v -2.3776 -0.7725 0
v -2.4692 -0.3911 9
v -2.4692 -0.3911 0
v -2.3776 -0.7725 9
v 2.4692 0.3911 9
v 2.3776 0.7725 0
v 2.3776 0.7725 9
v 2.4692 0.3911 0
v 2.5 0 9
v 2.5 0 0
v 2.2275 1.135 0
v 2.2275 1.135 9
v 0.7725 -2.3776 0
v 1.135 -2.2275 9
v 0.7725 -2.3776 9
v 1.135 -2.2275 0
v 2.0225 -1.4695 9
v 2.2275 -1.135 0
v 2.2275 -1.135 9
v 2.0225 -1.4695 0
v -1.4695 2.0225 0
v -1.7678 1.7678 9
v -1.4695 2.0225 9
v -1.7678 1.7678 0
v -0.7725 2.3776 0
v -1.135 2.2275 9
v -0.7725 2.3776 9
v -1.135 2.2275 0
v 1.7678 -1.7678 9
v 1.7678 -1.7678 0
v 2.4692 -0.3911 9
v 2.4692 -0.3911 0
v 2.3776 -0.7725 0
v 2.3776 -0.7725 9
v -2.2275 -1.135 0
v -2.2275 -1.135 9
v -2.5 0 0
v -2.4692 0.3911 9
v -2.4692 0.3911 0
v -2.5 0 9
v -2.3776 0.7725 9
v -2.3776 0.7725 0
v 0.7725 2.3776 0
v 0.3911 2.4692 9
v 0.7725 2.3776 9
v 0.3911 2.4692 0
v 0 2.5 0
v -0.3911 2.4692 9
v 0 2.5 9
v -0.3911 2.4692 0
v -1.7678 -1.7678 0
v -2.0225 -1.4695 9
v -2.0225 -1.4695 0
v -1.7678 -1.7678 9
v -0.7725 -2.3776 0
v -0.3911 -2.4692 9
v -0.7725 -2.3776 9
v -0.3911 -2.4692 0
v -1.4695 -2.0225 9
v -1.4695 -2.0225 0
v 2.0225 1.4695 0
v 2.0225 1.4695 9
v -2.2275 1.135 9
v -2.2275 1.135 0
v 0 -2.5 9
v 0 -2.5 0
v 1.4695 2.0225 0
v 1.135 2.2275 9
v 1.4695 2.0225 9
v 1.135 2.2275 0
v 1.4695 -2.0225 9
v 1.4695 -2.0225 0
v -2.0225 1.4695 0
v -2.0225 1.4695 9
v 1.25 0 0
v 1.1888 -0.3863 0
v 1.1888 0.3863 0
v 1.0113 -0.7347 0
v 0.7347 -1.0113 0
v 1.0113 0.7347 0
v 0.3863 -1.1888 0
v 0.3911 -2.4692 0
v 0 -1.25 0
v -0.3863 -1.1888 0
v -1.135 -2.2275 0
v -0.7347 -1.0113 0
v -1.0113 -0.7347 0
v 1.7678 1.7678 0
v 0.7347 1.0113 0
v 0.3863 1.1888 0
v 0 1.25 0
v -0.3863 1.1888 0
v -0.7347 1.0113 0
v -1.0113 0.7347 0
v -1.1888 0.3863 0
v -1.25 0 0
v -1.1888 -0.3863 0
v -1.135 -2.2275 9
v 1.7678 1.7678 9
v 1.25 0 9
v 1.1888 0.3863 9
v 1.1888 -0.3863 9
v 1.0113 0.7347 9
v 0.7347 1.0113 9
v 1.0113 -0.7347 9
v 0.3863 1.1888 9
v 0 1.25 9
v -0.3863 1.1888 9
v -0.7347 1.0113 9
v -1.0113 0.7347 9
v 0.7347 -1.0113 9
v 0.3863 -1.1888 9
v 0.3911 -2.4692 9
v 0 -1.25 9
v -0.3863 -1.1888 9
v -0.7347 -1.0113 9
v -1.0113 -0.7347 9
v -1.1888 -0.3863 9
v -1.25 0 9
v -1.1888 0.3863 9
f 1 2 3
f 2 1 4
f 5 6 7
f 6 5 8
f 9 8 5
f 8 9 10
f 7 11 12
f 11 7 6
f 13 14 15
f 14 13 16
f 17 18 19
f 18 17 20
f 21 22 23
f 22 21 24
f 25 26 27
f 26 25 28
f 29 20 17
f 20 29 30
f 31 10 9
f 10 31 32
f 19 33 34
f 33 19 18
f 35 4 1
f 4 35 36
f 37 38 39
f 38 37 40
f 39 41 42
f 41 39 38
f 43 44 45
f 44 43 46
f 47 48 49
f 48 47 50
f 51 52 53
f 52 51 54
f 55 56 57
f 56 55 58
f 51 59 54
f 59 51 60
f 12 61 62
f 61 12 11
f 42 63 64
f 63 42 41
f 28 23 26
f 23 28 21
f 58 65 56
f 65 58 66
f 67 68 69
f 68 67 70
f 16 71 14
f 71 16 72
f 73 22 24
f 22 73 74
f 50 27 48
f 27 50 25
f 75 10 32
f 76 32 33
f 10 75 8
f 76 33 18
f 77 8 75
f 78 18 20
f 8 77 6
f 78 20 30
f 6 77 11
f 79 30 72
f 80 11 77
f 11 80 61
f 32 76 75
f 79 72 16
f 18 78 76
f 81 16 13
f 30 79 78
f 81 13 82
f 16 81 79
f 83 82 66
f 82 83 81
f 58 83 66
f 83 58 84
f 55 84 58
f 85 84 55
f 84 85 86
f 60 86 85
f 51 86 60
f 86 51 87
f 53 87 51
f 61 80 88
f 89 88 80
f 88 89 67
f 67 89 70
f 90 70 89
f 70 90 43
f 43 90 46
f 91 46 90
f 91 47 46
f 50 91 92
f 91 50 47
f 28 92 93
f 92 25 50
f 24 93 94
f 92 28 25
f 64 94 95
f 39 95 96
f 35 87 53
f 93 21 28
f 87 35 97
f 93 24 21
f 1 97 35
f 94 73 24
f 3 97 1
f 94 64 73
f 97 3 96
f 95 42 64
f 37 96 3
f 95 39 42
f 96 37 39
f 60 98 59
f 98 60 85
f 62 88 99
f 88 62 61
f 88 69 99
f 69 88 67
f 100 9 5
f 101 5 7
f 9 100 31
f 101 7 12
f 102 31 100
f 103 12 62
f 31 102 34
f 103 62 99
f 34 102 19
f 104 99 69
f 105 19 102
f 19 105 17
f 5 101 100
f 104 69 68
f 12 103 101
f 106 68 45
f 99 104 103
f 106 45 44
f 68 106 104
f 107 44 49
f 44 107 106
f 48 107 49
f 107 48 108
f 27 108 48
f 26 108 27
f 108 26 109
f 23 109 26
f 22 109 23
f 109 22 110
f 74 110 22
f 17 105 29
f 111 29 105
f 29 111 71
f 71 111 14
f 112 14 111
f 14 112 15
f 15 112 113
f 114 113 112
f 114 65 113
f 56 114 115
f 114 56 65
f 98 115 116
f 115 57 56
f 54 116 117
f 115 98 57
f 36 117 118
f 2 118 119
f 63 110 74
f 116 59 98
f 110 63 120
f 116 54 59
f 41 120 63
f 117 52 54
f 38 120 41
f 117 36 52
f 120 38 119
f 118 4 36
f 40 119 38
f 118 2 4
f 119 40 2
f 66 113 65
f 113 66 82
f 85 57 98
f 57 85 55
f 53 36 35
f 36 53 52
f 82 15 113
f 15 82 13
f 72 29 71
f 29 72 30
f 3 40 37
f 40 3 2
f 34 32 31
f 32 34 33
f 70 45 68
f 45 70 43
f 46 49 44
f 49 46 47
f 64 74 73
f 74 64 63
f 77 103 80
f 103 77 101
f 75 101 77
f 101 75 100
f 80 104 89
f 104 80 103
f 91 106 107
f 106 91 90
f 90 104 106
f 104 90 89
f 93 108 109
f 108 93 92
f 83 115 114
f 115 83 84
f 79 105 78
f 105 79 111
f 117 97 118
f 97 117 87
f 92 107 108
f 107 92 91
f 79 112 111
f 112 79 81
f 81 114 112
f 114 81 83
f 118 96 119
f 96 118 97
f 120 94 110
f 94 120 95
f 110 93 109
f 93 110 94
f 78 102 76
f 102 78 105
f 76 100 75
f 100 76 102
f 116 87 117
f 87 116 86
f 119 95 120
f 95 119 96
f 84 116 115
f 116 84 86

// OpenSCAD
// Render Controls
$fa = 1;
$fs = 0.4;

// Dimensions
standoffRadius = 2.5;
standoffHeight = 9;
screwSize = 2.5;

// Module
module standoff() {
    difference() {
        cylinder(r=standoffRadius, h=standoffHeight);
        cylinder(r=screwSize / 2, h=standoffHeight);
    }
}

// Model
render() {
    standoff();
}
